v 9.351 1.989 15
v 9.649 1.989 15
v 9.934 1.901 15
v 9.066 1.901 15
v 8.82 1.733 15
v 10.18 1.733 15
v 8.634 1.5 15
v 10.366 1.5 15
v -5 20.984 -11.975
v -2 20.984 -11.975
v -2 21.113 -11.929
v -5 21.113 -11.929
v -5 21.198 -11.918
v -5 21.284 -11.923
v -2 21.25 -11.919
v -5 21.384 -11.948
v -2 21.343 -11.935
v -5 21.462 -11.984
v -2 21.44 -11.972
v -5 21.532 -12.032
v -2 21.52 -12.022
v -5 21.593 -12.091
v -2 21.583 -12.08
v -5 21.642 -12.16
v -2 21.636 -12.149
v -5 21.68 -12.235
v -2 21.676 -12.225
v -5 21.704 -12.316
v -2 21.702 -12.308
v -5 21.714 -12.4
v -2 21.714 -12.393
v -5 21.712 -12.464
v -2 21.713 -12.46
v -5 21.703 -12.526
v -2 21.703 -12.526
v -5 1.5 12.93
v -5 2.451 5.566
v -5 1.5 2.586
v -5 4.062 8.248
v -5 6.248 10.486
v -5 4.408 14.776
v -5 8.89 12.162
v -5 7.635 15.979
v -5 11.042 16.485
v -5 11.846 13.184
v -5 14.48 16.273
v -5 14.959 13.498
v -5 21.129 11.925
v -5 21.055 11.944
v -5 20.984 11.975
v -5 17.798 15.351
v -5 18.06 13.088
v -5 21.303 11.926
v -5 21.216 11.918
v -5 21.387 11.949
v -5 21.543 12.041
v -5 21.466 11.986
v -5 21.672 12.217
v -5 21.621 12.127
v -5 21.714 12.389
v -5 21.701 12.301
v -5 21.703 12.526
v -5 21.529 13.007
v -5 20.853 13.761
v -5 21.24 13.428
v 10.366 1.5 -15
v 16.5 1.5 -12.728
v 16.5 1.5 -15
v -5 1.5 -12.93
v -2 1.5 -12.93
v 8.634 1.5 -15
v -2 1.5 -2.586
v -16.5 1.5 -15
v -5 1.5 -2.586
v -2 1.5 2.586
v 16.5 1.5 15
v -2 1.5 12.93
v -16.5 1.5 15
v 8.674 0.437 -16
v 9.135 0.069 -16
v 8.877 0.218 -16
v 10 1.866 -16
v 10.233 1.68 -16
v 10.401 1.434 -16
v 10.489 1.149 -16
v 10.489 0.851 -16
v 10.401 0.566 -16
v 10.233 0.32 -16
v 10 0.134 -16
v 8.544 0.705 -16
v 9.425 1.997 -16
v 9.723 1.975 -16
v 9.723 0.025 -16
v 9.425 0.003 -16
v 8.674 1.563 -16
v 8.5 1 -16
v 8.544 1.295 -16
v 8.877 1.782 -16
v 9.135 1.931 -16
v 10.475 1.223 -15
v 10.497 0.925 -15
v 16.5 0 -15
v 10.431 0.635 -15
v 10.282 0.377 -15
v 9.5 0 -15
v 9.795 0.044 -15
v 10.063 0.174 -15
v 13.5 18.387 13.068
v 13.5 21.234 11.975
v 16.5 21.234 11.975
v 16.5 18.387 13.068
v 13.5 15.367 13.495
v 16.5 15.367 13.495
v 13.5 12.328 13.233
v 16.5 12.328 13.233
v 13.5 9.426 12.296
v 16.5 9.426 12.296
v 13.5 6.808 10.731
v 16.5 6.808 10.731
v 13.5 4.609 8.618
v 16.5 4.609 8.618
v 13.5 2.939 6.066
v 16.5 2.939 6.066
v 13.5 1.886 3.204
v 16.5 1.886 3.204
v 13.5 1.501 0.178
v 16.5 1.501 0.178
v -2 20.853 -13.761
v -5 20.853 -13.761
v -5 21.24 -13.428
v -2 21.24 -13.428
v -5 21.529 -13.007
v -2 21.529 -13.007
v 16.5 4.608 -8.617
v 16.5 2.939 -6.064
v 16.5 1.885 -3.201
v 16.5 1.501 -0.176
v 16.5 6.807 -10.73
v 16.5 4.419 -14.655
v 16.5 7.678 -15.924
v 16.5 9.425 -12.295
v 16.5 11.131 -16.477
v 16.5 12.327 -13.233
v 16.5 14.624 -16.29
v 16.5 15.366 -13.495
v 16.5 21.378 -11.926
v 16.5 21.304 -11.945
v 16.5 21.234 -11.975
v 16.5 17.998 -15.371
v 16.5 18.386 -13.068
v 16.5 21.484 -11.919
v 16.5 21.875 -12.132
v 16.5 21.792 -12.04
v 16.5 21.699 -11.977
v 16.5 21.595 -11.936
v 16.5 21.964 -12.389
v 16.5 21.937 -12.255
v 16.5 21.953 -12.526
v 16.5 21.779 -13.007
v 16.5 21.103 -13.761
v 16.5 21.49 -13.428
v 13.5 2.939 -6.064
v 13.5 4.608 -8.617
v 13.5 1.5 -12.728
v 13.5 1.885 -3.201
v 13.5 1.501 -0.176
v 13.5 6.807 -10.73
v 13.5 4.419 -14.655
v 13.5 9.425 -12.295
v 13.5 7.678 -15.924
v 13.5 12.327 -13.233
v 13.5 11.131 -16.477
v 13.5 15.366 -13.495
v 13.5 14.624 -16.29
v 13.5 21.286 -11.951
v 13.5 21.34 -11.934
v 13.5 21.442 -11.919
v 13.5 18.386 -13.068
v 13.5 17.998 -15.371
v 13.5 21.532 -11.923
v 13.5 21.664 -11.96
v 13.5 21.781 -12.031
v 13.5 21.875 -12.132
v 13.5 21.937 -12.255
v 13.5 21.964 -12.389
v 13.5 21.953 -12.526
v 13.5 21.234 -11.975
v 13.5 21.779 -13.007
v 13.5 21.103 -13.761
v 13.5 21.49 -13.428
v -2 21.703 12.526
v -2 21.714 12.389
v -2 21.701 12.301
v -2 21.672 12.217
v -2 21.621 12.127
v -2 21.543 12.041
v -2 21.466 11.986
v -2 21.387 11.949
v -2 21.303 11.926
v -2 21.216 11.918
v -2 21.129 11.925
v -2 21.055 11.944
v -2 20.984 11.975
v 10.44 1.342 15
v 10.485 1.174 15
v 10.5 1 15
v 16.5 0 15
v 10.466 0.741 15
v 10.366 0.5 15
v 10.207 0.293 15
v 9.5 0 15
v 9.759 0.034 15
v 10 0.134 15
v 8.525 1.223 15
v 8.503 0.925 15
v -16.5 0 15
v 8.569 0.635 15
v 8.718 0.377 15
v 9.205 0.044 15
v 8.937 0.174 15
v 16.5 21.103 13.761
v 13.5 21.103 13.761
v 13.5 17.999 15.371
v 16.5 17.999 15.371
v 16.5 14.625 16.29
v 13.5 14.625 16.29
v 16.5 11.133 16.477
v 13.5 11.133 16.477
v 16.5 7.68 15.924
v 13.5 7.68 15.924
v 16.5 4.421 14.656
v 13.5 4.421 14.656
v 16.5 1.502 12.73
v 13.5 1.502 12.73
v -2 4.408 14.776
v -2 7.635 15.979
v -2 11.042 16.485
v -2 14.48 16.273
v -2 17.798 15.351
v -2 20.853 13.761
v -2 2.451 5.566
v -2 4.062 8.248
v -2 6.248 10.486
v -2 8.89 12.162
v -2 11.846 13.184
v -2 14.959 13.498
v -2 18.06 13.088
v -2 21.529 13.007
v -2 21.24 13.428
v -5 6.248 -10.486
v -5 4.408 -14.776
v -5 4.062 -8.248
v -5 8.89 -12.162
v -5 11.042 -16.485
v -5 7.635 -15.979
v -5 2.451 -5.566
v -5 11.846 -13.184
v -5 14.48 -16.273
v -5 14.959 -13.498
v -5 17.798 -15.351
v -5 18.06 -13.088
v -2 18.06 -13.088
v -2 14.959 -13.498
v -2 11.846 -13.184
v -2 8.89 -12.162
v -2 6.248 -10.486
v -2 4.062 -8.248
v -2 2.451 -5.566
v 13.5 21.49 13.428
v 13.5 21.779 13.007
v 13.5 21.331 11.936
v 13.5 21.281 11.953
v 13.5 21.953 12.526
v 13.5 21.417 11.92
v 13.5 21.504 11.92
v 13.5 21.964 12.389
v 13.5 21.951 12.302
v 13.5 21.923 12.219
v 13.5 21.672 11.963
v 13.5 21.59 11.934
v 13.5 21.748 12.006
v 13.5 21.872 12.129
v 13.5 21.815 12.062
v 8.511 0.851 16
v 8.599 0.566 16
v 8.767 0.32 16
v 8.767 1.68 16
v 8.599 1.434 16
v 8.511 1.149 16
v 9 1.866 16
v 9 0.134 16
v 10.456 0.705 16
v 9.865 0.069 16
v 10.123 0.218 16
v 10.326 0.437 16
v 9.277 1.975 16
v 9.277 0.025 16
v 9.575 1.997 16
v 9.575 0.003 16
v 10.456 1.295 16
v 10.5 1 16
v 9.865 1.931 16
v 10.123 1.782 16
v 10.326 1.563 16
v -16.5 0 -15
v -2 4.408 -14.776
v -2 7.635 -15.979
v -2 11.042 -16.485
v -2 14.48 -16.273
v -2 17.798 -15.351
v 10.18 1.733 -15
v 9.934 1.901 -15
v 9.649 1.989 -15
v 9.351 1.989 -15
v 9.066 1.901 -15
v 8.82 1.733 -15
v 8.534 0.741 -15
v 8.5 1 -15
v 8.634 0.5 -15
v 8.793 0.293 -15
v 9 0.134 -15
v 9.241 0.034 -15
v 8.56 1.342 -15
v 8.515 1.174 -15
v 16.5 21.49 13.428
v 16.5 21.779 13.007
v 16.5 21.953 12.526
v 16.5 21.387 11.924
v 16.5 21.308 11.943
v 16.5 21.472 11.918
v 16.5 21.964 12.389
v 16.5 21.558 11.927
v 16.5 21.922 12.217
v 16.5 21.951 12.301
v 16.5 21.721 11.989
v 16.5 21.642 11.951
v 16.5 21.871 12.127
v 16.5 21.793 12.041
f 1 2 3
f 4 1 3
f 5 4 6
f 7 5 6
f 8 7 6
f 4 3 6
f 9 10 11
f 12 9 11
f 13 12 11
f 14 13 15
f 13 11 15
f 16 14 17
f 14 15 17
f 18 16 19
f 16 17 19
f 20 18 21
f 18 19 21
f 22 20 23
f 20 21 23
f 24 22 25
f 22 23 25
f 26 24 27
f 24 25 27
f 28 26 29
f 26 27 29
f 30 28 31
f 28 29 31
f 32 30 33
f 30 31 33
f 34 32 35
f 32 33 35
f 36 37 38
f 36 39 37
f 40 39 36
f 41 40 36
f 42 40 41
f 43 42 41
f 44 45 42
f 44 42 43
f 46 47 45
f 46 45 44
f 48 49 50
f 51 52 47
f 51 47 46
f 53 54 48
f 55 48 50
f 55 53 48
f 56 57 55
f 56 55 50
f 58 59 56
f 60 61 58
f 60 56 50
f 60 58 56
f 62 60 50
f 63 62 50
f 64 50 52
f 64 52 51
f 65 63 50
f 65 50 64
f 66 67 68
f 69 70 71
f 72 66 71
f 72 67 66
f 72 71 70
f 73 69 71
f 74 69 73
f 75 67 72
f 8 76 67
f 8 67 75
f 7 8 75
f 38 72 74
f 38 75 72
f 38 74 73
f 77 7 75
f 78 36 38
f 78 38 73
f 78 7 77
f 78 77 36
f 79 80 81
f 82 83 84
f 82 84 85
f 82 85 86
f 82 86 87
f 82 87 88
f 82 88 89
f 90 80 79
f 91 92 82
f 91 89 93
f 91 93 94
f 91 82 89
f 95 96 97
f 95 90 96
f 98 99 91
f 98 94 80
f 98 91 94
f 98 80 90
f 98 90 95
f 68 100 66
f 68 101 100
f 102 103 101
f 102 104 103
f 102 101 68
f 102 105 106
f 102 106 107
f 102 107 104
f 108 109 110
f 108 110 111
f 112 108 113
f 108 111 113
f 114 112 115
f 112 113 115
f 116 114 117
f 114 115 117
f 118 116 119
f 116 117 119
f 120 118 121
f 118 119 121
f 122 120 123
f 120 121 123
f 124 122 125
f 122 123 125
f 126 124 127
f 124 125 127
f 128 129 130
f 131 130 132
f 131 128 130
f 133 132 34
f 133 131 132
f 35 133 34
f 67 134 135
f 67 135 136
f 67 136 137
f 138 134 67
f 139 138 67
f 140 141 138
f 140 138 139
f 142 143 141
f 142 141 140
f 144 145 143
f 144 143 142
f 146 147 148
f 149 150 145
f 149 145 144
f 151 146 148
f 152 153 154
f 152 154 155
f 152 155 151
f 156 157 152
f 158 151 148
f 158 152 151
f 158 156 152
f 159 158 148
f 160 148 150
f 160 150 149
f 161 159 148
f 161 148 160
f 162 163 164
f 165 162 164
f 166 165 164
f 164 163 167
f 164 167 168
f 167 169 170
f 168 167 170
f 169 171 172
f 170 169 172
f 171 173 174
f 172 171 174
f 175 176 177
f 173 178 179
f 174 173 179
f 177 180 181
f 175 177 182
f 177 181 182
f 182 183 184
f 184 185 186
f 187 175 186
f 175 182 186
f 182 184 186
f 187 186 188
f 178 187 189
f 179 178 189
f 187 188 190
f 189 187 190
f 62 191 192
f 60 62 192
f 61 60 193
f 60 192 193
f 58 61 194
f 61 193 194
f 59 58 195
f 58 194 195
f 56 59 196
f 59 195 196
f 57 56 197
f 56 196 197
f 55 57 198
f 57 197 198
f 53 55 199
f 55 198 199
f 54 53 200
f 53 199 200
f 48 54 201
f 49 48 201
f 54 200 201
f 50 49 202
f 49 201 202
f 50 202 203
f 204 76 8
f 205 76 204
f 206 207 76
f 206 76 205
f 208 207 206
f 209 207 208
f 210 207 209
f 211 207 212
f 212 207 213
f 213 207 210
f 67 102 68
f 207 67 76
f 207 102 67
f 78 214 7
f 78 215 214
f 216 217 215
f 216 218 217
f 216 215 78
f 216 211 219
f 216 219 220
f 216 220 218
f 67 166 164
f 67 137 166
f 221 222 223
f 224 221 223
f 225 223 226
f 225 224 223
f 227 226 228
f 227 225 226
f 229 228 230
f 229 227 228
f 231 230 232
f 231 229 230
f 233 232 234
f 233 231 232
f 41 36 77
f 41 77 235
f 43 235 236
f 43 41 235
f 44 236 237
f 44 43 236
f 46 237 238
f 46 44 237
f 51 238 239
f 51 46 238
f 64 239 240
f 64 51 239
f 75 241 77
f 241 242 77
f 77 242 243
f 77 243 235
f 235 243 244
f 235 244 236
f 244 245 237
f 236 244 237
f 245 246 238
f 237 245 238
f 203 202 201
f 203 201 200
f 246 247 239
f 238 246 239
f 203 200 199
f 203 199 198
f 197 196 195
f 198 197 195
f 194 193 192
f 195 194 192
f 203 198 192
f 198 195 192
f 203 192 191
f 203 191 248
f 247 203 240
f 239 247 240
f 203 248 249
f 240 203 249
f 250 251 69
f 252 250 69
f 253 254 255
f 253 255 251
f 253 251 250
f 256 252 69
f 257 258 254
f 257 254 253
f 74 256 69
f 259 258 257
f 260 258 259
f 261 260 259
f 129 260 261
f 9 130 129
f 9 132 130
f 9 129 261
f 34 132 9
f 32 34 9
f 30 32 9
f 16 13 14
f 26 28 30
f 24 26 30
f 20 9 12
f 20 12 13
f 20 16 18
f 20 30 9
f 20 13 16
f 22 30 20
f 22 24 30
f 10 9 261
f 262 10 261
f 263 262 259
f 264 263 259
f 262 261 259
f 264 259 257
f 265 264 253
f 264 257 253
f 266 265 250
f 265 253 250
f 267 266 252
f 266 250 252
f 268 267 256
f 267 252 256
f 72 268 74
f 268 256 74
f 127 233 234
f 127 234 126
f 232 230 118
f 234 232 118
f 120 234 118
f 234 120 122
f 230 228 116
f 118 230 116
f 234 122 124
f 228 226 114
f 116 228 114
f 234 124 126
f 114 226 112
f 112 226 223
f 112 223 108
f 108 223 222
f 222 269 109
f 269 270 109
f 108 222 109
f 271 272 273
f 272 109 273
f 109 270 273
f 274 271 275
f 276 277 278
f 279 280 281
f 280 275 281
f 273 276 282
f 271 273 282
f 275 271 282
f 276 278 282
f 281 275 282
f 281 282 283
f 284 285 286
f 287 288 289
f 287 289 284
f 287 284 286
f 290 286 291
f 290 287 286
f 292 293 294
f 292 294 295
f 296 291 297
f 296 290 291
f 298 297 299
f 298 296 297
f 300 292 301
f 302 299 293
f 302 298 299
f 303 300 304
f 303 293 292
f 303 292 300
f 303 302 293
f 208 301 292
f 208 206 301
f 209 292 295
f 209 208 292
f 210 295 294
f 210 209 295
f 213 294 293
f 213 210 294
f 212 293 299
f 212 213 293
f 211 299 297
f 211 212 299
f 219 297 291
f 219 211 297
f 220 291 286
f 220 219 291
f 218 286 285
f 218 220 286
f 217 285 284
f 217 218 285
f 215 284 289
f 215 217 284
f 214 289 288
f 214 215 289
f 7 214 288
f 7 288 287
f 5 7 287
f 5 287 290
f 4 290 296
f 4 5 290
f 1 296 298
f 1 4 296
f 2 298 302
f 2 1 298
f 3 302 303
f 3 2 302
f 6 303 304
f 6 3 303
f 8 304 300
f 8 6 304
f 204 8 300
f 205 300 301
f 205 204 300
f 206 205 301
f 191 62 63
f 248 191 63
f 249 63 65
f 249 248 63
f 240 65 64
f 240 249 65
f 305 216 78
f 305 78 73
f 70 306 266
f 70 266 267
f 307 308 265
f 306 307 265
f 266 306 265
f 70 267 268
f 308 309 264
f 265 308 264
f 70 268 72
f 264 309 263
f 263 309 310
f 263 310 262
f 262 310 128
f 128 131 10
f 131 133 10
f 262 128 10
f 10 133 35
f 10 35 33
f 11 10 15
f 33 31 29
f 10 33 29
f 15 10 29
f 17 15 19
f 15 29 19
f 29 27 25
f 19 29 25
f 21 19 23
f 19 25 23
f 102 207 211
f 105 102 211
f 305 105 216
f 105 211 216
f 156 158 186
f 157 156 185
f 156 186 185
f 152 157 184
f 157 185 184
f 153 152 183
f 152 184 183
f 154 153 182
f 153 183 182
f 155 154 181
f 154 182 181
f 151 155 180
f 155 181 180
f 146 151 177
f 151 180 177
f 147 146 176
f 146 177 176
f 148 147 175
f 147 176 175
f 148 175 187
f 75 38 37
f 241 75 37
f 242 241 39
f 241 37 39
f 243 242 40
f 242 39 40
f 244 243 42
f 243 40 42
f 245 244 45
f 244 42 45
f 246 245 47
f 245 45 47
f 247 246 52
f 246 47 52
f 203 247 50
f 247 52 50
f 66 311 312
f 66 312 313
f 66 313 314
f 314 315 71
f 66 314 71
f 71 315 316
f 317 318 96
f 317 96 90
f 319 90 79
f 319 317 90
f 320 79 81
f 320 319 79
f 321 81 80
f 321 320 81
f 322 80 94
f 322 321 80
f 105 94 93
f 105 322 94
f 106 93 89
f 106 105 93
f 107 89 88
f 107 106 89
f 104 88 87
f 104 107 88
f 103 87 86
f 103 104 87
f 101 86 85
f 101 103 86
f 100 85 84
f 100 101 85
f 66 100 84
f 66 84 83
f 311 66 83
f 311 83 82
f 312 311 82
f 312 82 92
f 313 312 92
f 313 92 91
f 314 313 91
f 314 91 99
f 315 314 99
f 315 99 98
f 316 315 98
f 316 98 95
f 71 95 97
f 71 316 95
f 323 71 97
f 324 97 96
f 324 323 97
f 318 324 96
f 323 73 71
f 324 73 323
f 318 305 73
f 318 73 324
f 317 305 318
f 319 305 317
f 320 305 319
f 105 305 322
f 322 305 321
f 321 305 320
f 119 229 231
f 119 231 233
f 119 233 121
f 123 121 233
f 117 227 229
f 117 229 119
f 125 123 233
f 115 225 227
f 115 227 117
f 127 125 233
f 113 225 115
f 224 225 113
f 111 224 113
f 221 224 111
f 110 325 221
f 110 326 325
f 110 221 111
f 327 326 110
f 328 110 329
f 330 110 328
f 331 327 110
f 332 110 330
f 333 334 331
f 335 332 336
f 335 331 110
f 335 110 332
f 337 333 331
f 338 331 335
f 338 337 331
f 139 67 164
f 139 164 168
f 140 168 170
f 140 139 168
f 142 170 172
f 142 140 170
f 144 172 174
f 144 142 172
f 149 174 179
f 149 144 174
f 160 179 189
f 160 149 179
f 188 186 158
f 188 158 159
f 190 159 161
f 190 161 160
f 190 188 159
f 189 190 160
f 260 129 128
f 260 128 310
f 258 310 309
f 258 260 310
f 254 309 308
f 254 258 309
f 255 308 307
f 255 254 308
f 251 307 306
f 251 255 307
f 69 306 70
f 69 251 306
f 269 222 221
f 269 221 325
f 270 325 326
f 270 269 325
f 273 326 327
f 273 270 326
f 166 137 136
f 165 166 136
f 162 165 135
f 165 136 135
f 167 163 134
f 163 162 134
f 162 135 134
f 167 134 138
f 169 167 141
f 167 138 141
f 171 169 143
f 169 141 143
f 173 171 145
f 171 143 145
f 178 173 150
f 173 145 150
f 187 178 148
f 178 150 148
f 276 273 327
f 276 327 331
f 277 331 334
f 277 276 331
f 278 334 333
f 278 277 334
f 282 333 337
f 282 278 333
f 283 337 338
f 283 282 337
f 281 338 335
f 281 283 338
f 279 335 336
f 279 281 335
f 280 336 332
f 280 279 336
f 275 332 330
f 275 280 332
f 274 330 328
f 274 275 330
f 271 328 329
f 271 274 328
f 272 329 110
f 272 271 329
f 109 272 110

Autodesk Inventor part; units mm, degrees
sketch "Szkic1" plane through (0, 0, 0) normal (0, 1, 0) x (-1, 0, 0)
  line L0 (-16.5, 15) -> (16.5, 15)
  line L1 (16.5, 15) -> (16.5, -15)
  line L2 (16.5, -15) -> (-16.5, -15)
  line L3 (-16.5, -15) -> (-16.5, 15)
  line L4 (-16.5, 15) -> (16.5, -15) construction
  line L5 (16.5, 15) -> (-16.5, -15) construction
  point P0 (0, 0)
  dimension "d0" = 33
  dimension "d1" = 30
extrude "Wyciągnięcie proste1" add sketch "Szkic1" along normal blind 1.5
sketch "Szkic2" plane through (-16.5, 0, 15) normal (0, 0, 1) x (1, 0, 0)
  circle A0 centre (26, 1) radius 1
  point P0 (16.5, 0)
  dimension "d4" = 2
sketch "Szkic3" plane through (16.5, 0, -15) normal (0, 0, -1) x (-1, 0, 0)
  circle A0 centre (7, 1) radius 1
  point P0 (16.5, 0)
  dimension "d5" = 2
extrude "Wyciągnięcie proste2" add sketch "Szkic3" along normal blind 1
extrude "Wyciągnięcie proste3" add sketch "Szkic2" along normal blind 1
sketch "Szkic4" plane through (16.5, 0, 15) normal (1, 0, 0) x (0, 0, -1)
  arc A0 (3.456604, 22) -> (15, 1.5) centre (15, 15) ccw
  line L0 (1.875595, 22) -> (3.456604, 22)
  line L1 (26.543396, 22) -> (28.124405, 22)
  arc A1 (1.875595, 22) -> (2.270166, 1.502318) centre (15, 12) ccw
  line L2 (2.270166, 1.502318) -> (14.821882, 1.501175)
  line L3 (15.17566, 1.501143) -> (27.727922, 1.5)
  line L4 (14.821882, 1.501175) -> (15.17566, 1.501143)
  arc A2 (2.270166, 1.502318) -> (2.272078, 1.5) centre (15, 12) ccw
  arc A3 (15, 1.5) -> (26.543396, 22) centre (15, 15) ccw
  arc A4 (27.727922, 1.5) -> (28.124405, 22) centre (15, 12) ccw
  point P0 (15, 0)
sketch "Szkic4 outline for Wyciągnięcie proste4" plane through (16.5, 0, 15) normal (1, 0, 0) x (0, 0, -1)
  line L0 (3.456604, 22) -> (1.875595, 22)
  arc A0 (14.821882, 1.501175) -> (3.456604, 22) centre (15, 15) cw
  line L1 (2.270166, 1.502318) -> (14.821882, 1.501175)
  arc A1 (1.875595, 22) -> (2.270166, 1.502318) centre (15, 12) ccw
  arc A2 (26.543396, 22) -> (15.17566, 1.501143) centre (15, 15) cw
  line L2 (28.124405, 22) -> (26.543396, 22)
  arc A3 (27.727922, 1.5) -> (28.124405, 22) centre (15, 12) ccw
  line L3 (15.17566, 1.501143) -> (27.727922, 1.5)
extrude "Wyciągnięcie proste4" add sketch "Szkic4 outline for Wyciągnięcie proste4" against normal blind 3
ref_plane "Płaszczyzna konstrukcyjna1" through (-11.5, 3.25, -15) normal (-1, 0, 0) x (0, 0, 1)
ref_plane "Płaszczyzna konstrukcyjna2" through (-11.5, -0.25, -15) normal (-1, 0, 0) x (0, 0, 1)
ref_plane "Płaszczyzna konstrukcyjna3" through (-5, -0.25, -15) normal (-1, 0, 0) x (0, 0, 1)
sketch "Szkic5" plane through (-5, -0.25, -15) normal (-1, 0, 0) x (0, 0, 1)
  arc A0 (3.456604, 22) -> (15, 1.5) centre (15, 15) ccw
  line L0 (1.875595, 22) -> (3.456604, 22)
  line L1 (26.543396, 22) -> (28.124405, 22)
  arc A1 (1.875595, 22) -> (2.270166, 1.502318) centre (15, 12) ccw
  line L2 (2.270166, 1.502318) -> (14.821882, 1.501175)
  line L3 (15.17566, 1.501143) -> (27.727922, 1.5)
  line L4 (14.821882, 1.501175) -> (15.17566, 1.501143)
  arc A2 (2.270166, 1.502318) -> (2.272078, 1.5) centre (15, 12) ccw
  arc A3 (15, 1.5) -> (26.543396, 22) centre (15, 15) ccw
  arc A4 (27.727922, 1.5) -> (28.124405, 22) centre (15, 12) ccw
  point P0 (15, 0)
extrude "Wyciągnięcie proste5" add sketch "Szkic5" against normal blind 3
fillet "Zaokrąglenie1" radius 2 1 edges at (15, 22, 13.1244)
fillet "Zaokrąglenie2" radius 2 1 edges at (15, 22, -13.1244)
fillet "Zaokrąglenie3" radius 2 1 edges at (-3.5, 21.75, -13.1244)
fillet "Zaokrąglenie4" radius 2 1 edges at (-3.5, 21.75, 13.1244)
fillet "Zaokrąglenie5" radius 0.5 1 edges at (15, 22, 11.5434)
fillet "Zaokrąglenie6" radius 0.5 1 edges at (-3.5, 21.75, 11.5434)
fillet "Zaokrąglenie7" radius 0.5 1 edges at (-3.5, 21.75, -11.5434)
fillet "Zaokrąglenie8" radius 0.5 1 edges at (15, 22, -11.5434)
properties part number "FanGrasp"
